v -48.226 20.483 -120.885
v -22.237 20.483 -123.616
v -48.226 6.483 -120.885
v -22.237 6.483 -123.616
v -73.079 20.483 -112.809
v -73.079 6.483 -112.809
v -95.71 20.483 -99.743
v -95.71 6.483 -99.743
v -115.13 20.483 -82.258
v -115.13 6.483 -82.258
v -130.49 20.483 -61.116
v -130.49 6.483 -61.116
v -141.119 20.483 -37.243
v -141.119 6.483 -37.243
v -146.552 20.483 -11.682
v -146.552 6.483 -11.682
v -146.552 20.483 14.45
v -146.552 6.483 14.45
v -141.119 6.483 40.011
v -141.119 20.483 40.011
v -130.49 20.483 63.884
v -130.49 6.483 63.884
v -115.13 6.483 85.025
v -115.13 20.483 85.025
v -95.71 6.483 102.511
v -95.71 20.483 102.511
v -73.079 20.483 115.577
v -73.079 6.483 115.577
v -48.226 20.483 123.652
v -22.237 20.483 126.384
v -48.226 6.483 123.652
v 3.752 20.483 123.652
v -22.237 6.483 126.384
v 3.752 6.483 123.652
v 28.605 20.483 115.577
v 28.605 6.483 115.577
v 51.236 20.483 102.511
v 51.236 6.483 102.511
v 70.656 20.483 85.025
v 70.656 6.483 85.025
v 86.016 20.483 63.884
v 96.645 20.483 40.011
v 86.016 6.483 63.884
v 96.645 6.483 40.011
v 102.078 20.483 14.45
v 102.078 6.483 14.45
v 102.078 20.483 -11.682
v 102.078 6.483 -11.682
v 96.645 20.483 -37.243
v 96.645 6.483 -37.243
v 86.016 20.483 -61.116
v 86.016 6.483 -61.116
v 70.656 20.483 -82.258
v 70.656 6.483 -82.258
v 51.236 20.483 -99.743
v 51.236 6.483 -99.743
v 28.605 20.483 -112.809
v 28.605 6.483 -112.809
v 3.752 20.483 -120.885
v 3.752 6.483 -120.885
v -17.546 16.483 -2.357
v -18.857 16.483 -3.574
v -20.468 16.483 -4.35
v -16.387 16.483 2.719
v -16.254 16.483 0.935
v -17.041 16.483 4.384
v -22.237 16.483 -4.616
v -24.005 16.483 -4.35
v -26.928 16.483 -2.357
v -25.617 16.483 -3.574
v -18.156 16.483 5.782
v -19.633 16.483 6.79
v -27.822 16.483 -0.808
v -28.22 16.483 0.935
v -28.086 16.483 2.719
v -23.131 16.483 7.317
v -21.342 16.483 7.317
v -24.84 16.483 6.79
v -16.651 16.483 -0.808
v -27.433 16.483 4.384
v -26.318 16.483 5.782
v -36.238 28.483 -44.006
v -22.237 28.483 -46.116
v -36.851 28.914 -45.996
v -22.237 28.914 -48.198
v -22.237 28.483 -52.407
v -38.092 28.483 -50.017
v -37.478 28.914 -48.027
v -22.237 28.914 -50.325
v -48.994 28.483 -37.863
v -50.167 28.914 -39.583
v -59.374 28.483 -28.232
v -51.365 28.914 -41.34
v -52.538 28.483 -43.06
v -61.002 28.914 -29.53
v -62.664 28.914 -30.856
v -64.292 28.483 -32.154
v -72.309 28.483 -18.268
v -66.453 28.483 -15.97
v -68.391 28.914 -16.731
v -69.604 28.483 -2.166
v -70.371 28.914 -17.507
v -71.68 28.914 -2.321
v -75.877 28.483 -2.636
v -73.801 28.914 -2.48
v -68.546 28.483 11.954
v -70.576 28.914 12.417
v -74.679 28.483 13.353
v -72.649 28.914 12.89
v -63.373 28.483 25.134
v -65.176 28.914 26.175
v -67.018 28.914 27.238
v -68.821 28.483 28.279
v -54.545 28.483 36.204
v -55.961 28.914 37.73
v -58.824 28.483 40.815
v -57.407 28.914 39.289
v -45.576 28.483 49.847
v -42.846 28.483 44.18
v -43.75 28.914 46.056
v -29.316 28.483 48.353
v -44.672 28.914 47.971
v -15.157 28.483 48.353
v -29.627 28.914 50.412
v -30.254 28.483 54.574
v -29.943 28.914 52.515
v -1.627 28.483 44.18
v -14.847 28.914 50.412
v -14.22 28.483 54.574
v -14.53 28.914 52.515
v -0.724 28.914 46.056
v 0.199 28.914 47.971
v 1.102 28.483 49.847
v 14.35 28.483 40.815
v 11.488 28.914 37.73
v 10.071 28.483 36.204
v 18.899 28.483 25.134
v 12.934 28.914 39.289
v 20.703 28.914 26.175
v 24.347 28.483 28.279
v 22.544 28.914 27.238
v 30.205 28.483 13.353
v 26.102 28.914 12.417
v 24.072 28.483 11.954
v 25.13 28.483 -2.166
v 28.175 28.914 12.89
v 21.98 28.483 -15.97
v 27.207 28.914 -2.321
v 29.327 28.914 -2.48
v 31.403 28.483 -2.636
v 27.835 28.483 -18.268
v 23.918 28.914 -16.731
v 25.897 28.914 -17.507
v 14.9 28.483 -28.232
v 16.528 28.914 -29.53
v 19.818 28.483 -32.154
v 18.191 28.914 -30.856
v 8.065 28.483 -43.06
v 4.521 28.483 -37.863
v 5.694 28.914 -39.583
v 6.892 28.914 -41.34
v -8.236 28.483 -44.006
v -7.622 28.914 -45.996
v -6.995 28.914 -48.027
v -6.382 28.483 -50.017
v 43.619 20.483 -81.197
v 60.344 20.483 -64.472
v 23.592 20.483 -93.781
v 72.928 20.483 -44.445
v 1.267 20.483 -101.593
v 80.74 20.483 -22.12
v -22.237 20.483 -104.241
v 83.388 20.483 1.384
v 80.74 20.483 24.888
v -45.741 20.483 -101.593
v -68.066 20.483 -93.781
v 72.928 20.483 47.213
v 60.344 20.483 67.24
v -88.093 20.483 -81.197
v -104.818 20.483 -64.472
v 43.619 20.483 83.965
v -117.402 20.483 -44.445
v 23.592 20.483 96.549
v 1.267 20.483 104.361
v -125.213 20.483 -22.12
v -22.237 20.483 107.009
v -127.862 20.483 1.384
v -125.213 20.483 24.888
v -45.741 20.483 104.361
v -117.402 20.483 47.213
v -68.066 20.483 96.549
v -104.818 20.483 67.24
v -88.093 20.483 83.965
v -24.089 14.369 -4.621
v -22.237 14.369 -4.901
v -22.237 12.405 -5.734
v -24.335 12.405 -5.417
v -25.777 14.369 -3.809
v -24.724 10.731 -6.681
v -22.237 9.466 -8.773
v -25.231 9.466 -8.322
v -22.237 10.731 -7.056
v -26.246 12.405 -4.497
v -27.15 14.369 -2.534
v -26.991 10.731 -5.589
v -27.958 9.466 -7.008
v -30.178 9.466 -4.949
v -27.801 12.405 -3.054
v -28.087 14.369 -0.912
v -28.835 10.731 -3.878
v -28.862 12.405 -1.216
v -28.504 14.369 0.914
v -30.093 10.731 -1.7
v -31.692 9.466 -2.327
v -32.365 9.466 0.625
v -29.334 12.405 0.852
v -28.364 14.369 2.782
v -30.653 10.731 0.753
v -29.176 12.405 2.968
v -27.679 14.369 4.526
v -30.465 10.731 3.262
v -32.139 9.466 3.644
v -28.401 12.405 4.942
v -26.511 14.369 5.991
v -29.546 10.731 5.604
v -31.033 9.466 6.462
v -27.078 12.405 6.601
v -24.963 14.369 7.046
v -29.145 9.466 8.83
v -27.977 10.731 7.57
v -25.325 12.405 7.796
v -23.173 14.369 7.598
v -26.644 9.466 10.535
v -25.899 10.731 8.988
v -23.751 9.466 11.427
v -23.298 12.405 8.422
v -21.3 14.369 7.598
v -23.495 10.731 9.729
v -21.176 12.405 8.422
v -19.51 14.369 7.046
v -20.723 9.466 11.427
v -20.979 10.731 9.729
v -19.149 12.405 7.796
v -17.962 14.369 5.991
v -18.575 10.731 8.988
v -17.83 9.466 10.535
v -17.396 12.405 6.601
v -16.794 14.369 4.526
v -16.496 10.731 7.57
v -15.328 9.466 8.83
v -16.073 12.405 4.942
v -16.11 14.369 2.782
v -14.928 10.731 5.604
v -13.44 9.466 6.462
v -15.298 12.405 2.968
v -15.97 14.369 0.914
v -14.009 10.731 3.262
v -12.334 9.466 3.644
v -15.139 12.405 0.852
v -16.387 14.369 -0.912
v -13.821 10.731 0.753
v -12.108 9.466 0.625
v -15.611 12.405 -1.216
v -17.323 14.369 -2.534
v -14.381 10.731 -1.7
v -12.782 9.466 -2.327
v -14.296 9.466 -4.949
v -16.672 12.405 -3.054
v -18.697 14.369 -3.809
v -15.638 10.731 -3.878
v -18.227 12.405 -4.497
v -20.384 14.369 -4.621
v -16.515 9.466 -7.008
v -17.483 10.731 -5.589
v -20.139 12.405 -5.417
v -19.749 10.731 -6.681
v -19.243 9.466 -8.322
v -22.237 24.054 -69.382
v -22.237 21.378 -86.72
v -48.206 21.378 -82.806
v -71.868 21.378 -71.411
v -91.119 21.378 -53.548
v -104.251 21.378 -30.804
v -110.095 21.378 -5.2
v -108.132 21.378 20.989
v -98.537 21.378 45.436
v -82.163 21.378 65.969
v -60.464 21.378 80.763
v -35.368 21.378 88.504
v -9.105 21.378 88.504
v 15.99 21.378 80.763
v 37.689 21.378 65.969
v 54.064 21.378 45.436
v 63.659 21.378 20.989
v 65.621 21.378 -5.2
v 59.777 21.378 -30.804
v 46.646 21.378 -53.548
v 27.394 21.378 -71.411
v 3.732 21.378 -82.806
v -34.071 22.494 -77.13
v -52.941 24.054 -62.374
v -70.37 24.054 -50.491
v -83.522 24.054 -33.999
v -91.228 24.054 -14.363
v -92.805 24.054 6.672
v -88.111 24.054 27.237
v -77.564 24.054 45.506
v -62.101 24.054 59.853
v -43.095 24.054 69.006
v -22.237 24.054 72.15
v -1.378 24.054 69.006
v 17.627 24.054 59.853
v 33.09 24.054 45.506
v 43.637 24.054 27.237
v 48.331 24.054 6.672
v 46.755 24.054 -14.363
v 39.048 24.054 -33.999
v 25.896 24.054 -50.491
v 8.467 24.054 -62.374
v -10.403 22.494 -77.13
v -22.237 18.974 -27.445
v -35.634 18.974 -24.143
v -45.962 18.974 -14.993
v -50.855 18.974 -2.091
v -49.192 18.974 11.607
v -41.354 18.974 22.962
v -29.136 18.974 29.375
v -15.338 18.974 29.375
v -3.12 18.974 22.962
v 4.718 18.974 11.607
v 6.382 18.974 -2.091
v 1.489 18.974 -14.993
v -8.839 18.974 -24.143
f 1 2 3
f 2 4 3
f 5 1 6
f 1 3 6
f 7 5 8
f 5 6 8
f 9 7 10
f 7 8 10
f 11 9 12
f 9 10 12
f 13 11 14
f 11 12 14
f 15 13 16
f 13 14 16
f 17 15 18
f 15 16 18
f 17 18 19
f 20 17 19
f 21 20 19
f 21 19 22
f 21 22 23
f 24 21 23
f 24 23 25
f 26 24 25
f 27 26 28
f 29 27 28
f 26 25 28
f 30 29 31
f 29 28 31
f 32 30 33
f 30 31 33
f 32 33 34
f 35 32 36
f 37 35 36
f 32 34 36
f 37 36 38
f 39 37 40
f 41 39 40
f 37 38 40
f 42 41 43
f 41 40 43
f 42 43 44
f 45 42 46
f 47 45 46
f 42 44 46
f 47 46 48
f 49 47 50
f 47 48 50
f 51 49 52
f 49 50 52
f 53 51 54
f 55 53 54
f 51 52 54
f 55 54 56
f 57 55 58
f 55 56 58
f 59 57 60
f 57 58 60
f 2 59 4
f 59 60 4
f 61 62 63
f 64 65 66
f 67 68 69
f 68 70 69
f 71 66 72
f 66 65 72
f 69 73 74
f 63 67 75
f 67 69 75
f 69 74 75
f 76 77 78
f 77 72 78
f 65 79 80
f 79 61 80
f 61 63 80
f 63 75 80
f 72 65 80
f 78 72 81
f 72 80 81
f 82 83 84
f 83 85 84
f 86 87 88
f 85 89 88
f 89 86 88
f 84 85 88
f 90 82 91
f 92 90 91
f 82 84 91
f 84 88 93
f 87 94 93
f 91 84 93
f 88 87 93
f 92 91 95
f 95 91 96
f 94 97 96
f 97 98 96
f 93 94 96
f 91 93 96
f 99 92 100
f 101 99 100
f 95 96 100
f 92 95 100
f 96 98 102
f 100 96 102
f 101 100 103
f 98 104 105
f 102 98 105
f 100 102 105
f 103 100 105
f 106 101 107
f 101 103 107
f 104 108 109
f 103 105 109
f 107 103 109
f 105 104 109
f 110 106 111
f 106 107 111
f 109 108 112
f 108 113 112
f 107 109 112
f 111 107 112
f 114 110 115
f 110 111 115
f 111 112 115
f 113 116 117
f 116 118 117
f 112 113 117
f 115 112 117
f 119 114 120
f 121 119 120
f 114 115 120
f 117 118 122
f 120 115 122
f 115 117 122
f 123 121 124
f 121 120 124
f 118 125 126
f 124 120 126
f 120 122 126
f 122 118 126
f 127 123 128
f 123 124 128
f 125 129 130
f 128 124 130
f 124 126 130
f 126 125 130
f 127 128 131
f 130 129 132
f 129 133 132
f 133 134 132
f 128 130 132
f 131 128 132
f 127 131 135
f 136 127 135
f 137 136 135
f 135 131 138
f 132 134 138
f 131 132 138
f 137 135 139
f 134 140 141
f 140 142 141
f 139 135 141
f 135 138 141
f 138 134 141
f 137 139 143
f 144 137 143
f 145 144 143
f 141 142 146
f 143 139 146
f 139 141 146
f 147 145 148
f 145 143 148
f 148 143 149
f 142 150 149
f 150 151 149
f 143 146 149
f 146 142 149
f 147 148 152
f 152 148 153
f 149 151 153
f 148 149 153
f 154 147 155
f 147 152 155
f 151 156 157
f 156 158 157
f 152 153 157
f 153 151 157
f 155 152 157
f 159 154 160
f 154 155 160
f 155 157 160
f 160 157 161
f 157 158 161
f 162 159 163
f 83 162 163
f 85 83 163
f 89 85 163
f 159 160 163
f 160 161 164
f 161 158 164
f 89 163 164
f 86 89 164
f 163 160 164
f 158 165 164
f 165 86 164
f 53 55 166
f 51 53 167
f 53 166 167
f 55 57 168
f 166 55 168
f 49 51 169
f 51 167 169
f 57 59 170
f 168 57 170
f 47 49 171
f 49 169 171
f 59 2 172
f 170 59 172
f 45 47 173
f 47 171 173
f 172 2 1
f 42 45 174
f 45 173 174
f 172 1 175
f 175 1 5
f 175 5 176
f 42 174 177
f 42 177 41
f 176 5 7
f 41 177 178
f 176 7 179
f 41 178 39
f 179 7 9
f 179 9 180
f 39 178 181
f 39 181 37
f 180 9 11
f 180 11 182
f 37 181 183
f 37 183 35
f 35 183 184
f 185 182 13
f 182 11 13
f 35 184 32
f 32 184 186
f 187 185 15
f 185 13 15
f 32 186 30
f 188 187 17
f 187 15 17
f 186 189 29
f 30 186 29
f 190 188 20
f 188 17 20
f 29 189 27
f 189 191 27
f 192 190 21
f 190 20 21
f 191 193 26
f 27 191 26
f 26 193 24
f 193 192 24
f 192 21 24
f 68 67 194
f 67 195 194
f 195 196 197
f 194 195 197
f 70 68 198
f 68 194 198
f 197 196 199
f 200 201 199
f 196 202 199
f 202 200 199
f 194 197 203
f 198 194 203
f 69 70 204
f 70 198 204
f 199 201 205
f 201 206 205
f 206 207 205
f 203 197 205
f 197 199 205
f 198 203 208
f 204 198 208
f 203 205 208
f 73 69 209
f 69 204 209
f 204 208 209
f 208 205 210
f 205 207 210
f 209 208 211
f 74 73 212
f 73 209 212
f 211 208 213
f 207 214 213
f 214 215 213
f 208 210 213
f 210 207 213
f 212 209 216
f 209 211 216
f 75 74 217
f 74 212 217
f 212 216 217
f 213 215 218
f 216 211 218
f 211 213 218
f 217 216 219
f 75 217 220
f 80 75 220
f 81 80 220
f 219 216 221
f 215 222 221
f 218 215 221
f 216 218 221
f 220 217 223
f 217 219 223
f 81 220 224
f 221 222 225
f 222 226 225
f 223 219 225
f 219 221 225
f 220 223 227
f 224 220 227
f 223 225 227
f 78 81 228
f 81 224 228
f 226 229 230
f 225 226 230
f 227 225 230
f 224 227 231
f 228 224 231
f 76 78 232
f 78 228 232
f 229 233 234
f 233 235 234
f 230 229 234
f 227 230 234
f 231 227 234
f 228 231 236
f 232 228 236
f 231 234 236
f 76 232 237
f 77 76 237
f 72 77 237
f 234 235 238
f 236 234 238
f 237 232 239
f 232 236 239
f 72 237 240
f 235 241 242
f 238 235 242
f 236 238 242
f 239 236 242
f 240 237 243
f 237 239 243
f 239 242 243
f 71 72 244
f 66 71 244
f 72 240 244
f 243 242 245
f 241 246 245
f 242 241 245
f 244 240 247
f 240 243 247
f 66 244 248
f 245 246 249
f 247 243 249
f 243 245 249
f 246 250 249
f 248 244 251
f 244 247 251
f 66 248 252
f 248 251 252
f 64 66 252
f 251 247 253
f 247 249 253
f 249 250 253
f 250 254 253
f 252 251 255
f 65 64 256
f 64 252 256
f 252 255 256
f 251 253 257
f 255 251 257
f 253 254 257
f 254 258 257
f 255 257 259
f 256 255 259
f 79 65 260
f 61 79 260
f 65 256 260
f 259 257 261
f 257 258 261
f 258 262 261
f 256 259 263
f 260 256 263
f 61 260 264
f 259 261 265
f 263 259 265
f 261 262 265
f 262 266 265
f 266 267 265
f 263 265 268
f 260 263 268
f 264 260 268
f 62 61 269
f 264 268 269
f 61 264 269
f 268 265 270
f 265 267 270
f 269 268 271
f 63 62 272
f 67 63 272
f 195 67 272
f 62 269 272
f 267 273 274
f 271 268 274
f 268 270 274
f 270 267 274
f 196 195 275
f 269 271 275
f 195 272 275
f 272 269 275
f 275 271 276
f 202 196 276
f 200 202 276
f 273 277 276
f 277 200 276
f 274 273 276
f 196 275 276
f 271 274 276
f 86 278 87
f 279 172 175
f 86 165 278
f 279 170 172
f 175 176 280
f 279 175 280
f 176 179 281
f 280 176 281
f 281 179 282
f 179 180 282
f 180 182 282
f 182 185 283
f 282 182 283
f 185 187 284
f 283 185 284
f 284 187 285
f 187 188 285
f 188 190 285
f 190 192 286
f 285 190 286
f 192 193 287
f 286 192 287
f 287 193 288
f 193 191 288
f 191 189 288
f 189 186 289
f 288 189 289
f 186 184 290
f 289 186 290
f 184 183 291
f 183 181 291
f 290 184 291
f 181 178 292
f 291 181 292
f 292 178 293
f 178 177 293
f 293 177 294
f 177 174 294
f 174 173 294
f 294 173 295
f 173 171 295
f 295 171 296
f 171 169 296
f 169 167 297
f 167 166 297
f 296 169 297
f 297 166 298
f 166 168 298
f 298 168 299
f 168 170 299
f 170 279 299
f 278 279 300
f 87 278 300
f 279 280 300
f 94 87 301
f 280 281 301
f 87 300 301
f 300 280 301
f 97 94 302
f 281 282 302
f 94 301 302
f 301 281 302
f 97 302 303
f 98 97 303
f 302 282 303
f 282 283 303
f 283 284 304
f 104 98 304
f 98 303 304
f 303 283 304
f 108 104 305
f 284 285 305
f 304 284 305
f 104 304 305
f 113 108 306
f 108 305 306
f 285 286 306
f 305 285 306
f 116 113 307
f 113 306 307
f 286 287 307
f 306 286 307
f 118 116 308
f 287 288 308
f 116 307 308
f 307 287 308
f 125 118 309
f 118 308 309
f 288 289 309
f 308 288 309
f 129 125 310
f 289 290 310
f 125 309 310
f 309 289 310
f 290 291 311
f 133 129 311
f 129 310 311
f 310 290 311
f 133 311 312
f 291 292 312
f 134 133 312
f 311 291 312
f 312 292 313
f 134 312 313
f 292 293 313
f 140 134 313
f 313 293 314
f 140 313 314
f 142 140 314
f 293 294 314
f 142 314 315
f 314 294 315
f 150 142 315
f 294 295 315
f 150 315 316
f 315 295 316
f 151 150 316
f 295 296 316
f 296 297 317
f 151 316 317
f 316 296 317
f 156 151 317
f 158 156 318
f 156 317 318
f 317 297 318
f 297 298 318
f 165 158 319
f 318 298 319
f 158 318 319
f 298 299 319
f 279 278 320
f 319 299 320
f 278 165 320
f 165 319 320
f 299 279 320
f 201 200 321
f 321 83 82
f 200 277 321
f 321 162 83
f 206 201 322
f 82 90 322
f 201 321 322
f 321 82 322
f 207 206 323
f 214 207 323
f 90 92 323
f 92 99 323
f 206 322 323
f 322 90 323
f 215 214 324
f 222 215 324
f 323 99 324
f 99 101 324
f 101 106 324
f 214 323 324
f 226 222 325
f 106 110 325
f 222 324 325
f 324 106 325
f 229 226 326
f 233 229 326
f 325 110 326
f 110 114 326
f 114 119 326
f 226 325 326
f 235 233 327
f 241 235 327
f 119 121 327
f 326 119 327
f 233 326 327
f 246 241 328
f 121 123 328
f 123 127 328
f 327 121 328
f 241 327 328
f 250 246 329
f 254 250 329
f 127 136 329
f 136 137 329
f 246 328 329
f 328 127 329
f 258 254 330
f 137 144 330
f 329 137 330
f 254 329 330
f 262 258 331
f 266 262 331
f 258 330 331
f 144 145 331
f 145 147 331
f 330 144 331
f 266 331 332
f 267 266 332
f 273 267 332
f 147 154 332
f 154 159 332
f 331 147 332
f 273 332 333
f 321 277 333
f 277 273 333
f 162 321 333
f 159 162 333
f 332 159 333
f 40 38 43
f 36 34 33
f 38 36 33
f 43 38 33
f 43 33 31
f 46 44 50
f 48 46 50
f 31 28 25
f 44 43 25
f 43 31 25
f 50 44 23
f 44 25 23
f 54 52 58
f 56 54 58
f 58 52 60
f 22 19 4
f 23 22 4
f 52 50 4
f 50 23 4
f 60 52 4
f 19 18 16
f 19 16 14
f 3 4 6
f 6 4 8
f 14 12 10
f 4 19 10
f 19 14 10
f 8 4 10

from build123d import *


with BuildPart() as part:
    # Sketch1 → Revolve1 (revolve)
    with BuildSketch(Plane(origin=(0, 0, 1.383780883), x_dir=(0, -1, 0), z_dir=(0, 0, 1)), mode=Mode.PRIVATE) as revolve1_sk:
        with BuildLine():
            Line((-6.482641531, -22.236737445), (-16.482641531, -22.236737445))
            Line((-16.482641531, -22.236737445), (-16.482641531, -16.236737445))
            ThreePointArc((-16.482641531, -16.236737445), (-12.404820423, -15.119424058), (-9.466050343, -12.079581198))
            Line((-9.466050343, -12.079581198), (-28.482641531, 25.263262555))
            ThreePointArc((-28.482641531, 25.263262555), (-28.968073531, 28.408526495), (-28.482641531, 31.553790435))
            ThreePointArc((-28.482641531, 31.553790435), (-22.494411783, 57.164168196), (-20.482641531, 83.388262555))
            Line((-20.482641531, 83.388262555), (-20.482641531, 102.763262555))
            Line((-20.482641531, 102.763262555), (-6.482641531, 102.763262555))
            Line((-6.482641531, 102.763262555), (-6.482641531, -22.236737445))
        make_face()
    revolve(revolve1_sk.sketch.rotate(Axis((-22.236737445, 6.482641531, 1.383780883), (0, 1, 0)), 90), axis=Axis((-22.236737445, 6.482641531, 1.383780883), (0, 1, 0)))


solid = part.part
